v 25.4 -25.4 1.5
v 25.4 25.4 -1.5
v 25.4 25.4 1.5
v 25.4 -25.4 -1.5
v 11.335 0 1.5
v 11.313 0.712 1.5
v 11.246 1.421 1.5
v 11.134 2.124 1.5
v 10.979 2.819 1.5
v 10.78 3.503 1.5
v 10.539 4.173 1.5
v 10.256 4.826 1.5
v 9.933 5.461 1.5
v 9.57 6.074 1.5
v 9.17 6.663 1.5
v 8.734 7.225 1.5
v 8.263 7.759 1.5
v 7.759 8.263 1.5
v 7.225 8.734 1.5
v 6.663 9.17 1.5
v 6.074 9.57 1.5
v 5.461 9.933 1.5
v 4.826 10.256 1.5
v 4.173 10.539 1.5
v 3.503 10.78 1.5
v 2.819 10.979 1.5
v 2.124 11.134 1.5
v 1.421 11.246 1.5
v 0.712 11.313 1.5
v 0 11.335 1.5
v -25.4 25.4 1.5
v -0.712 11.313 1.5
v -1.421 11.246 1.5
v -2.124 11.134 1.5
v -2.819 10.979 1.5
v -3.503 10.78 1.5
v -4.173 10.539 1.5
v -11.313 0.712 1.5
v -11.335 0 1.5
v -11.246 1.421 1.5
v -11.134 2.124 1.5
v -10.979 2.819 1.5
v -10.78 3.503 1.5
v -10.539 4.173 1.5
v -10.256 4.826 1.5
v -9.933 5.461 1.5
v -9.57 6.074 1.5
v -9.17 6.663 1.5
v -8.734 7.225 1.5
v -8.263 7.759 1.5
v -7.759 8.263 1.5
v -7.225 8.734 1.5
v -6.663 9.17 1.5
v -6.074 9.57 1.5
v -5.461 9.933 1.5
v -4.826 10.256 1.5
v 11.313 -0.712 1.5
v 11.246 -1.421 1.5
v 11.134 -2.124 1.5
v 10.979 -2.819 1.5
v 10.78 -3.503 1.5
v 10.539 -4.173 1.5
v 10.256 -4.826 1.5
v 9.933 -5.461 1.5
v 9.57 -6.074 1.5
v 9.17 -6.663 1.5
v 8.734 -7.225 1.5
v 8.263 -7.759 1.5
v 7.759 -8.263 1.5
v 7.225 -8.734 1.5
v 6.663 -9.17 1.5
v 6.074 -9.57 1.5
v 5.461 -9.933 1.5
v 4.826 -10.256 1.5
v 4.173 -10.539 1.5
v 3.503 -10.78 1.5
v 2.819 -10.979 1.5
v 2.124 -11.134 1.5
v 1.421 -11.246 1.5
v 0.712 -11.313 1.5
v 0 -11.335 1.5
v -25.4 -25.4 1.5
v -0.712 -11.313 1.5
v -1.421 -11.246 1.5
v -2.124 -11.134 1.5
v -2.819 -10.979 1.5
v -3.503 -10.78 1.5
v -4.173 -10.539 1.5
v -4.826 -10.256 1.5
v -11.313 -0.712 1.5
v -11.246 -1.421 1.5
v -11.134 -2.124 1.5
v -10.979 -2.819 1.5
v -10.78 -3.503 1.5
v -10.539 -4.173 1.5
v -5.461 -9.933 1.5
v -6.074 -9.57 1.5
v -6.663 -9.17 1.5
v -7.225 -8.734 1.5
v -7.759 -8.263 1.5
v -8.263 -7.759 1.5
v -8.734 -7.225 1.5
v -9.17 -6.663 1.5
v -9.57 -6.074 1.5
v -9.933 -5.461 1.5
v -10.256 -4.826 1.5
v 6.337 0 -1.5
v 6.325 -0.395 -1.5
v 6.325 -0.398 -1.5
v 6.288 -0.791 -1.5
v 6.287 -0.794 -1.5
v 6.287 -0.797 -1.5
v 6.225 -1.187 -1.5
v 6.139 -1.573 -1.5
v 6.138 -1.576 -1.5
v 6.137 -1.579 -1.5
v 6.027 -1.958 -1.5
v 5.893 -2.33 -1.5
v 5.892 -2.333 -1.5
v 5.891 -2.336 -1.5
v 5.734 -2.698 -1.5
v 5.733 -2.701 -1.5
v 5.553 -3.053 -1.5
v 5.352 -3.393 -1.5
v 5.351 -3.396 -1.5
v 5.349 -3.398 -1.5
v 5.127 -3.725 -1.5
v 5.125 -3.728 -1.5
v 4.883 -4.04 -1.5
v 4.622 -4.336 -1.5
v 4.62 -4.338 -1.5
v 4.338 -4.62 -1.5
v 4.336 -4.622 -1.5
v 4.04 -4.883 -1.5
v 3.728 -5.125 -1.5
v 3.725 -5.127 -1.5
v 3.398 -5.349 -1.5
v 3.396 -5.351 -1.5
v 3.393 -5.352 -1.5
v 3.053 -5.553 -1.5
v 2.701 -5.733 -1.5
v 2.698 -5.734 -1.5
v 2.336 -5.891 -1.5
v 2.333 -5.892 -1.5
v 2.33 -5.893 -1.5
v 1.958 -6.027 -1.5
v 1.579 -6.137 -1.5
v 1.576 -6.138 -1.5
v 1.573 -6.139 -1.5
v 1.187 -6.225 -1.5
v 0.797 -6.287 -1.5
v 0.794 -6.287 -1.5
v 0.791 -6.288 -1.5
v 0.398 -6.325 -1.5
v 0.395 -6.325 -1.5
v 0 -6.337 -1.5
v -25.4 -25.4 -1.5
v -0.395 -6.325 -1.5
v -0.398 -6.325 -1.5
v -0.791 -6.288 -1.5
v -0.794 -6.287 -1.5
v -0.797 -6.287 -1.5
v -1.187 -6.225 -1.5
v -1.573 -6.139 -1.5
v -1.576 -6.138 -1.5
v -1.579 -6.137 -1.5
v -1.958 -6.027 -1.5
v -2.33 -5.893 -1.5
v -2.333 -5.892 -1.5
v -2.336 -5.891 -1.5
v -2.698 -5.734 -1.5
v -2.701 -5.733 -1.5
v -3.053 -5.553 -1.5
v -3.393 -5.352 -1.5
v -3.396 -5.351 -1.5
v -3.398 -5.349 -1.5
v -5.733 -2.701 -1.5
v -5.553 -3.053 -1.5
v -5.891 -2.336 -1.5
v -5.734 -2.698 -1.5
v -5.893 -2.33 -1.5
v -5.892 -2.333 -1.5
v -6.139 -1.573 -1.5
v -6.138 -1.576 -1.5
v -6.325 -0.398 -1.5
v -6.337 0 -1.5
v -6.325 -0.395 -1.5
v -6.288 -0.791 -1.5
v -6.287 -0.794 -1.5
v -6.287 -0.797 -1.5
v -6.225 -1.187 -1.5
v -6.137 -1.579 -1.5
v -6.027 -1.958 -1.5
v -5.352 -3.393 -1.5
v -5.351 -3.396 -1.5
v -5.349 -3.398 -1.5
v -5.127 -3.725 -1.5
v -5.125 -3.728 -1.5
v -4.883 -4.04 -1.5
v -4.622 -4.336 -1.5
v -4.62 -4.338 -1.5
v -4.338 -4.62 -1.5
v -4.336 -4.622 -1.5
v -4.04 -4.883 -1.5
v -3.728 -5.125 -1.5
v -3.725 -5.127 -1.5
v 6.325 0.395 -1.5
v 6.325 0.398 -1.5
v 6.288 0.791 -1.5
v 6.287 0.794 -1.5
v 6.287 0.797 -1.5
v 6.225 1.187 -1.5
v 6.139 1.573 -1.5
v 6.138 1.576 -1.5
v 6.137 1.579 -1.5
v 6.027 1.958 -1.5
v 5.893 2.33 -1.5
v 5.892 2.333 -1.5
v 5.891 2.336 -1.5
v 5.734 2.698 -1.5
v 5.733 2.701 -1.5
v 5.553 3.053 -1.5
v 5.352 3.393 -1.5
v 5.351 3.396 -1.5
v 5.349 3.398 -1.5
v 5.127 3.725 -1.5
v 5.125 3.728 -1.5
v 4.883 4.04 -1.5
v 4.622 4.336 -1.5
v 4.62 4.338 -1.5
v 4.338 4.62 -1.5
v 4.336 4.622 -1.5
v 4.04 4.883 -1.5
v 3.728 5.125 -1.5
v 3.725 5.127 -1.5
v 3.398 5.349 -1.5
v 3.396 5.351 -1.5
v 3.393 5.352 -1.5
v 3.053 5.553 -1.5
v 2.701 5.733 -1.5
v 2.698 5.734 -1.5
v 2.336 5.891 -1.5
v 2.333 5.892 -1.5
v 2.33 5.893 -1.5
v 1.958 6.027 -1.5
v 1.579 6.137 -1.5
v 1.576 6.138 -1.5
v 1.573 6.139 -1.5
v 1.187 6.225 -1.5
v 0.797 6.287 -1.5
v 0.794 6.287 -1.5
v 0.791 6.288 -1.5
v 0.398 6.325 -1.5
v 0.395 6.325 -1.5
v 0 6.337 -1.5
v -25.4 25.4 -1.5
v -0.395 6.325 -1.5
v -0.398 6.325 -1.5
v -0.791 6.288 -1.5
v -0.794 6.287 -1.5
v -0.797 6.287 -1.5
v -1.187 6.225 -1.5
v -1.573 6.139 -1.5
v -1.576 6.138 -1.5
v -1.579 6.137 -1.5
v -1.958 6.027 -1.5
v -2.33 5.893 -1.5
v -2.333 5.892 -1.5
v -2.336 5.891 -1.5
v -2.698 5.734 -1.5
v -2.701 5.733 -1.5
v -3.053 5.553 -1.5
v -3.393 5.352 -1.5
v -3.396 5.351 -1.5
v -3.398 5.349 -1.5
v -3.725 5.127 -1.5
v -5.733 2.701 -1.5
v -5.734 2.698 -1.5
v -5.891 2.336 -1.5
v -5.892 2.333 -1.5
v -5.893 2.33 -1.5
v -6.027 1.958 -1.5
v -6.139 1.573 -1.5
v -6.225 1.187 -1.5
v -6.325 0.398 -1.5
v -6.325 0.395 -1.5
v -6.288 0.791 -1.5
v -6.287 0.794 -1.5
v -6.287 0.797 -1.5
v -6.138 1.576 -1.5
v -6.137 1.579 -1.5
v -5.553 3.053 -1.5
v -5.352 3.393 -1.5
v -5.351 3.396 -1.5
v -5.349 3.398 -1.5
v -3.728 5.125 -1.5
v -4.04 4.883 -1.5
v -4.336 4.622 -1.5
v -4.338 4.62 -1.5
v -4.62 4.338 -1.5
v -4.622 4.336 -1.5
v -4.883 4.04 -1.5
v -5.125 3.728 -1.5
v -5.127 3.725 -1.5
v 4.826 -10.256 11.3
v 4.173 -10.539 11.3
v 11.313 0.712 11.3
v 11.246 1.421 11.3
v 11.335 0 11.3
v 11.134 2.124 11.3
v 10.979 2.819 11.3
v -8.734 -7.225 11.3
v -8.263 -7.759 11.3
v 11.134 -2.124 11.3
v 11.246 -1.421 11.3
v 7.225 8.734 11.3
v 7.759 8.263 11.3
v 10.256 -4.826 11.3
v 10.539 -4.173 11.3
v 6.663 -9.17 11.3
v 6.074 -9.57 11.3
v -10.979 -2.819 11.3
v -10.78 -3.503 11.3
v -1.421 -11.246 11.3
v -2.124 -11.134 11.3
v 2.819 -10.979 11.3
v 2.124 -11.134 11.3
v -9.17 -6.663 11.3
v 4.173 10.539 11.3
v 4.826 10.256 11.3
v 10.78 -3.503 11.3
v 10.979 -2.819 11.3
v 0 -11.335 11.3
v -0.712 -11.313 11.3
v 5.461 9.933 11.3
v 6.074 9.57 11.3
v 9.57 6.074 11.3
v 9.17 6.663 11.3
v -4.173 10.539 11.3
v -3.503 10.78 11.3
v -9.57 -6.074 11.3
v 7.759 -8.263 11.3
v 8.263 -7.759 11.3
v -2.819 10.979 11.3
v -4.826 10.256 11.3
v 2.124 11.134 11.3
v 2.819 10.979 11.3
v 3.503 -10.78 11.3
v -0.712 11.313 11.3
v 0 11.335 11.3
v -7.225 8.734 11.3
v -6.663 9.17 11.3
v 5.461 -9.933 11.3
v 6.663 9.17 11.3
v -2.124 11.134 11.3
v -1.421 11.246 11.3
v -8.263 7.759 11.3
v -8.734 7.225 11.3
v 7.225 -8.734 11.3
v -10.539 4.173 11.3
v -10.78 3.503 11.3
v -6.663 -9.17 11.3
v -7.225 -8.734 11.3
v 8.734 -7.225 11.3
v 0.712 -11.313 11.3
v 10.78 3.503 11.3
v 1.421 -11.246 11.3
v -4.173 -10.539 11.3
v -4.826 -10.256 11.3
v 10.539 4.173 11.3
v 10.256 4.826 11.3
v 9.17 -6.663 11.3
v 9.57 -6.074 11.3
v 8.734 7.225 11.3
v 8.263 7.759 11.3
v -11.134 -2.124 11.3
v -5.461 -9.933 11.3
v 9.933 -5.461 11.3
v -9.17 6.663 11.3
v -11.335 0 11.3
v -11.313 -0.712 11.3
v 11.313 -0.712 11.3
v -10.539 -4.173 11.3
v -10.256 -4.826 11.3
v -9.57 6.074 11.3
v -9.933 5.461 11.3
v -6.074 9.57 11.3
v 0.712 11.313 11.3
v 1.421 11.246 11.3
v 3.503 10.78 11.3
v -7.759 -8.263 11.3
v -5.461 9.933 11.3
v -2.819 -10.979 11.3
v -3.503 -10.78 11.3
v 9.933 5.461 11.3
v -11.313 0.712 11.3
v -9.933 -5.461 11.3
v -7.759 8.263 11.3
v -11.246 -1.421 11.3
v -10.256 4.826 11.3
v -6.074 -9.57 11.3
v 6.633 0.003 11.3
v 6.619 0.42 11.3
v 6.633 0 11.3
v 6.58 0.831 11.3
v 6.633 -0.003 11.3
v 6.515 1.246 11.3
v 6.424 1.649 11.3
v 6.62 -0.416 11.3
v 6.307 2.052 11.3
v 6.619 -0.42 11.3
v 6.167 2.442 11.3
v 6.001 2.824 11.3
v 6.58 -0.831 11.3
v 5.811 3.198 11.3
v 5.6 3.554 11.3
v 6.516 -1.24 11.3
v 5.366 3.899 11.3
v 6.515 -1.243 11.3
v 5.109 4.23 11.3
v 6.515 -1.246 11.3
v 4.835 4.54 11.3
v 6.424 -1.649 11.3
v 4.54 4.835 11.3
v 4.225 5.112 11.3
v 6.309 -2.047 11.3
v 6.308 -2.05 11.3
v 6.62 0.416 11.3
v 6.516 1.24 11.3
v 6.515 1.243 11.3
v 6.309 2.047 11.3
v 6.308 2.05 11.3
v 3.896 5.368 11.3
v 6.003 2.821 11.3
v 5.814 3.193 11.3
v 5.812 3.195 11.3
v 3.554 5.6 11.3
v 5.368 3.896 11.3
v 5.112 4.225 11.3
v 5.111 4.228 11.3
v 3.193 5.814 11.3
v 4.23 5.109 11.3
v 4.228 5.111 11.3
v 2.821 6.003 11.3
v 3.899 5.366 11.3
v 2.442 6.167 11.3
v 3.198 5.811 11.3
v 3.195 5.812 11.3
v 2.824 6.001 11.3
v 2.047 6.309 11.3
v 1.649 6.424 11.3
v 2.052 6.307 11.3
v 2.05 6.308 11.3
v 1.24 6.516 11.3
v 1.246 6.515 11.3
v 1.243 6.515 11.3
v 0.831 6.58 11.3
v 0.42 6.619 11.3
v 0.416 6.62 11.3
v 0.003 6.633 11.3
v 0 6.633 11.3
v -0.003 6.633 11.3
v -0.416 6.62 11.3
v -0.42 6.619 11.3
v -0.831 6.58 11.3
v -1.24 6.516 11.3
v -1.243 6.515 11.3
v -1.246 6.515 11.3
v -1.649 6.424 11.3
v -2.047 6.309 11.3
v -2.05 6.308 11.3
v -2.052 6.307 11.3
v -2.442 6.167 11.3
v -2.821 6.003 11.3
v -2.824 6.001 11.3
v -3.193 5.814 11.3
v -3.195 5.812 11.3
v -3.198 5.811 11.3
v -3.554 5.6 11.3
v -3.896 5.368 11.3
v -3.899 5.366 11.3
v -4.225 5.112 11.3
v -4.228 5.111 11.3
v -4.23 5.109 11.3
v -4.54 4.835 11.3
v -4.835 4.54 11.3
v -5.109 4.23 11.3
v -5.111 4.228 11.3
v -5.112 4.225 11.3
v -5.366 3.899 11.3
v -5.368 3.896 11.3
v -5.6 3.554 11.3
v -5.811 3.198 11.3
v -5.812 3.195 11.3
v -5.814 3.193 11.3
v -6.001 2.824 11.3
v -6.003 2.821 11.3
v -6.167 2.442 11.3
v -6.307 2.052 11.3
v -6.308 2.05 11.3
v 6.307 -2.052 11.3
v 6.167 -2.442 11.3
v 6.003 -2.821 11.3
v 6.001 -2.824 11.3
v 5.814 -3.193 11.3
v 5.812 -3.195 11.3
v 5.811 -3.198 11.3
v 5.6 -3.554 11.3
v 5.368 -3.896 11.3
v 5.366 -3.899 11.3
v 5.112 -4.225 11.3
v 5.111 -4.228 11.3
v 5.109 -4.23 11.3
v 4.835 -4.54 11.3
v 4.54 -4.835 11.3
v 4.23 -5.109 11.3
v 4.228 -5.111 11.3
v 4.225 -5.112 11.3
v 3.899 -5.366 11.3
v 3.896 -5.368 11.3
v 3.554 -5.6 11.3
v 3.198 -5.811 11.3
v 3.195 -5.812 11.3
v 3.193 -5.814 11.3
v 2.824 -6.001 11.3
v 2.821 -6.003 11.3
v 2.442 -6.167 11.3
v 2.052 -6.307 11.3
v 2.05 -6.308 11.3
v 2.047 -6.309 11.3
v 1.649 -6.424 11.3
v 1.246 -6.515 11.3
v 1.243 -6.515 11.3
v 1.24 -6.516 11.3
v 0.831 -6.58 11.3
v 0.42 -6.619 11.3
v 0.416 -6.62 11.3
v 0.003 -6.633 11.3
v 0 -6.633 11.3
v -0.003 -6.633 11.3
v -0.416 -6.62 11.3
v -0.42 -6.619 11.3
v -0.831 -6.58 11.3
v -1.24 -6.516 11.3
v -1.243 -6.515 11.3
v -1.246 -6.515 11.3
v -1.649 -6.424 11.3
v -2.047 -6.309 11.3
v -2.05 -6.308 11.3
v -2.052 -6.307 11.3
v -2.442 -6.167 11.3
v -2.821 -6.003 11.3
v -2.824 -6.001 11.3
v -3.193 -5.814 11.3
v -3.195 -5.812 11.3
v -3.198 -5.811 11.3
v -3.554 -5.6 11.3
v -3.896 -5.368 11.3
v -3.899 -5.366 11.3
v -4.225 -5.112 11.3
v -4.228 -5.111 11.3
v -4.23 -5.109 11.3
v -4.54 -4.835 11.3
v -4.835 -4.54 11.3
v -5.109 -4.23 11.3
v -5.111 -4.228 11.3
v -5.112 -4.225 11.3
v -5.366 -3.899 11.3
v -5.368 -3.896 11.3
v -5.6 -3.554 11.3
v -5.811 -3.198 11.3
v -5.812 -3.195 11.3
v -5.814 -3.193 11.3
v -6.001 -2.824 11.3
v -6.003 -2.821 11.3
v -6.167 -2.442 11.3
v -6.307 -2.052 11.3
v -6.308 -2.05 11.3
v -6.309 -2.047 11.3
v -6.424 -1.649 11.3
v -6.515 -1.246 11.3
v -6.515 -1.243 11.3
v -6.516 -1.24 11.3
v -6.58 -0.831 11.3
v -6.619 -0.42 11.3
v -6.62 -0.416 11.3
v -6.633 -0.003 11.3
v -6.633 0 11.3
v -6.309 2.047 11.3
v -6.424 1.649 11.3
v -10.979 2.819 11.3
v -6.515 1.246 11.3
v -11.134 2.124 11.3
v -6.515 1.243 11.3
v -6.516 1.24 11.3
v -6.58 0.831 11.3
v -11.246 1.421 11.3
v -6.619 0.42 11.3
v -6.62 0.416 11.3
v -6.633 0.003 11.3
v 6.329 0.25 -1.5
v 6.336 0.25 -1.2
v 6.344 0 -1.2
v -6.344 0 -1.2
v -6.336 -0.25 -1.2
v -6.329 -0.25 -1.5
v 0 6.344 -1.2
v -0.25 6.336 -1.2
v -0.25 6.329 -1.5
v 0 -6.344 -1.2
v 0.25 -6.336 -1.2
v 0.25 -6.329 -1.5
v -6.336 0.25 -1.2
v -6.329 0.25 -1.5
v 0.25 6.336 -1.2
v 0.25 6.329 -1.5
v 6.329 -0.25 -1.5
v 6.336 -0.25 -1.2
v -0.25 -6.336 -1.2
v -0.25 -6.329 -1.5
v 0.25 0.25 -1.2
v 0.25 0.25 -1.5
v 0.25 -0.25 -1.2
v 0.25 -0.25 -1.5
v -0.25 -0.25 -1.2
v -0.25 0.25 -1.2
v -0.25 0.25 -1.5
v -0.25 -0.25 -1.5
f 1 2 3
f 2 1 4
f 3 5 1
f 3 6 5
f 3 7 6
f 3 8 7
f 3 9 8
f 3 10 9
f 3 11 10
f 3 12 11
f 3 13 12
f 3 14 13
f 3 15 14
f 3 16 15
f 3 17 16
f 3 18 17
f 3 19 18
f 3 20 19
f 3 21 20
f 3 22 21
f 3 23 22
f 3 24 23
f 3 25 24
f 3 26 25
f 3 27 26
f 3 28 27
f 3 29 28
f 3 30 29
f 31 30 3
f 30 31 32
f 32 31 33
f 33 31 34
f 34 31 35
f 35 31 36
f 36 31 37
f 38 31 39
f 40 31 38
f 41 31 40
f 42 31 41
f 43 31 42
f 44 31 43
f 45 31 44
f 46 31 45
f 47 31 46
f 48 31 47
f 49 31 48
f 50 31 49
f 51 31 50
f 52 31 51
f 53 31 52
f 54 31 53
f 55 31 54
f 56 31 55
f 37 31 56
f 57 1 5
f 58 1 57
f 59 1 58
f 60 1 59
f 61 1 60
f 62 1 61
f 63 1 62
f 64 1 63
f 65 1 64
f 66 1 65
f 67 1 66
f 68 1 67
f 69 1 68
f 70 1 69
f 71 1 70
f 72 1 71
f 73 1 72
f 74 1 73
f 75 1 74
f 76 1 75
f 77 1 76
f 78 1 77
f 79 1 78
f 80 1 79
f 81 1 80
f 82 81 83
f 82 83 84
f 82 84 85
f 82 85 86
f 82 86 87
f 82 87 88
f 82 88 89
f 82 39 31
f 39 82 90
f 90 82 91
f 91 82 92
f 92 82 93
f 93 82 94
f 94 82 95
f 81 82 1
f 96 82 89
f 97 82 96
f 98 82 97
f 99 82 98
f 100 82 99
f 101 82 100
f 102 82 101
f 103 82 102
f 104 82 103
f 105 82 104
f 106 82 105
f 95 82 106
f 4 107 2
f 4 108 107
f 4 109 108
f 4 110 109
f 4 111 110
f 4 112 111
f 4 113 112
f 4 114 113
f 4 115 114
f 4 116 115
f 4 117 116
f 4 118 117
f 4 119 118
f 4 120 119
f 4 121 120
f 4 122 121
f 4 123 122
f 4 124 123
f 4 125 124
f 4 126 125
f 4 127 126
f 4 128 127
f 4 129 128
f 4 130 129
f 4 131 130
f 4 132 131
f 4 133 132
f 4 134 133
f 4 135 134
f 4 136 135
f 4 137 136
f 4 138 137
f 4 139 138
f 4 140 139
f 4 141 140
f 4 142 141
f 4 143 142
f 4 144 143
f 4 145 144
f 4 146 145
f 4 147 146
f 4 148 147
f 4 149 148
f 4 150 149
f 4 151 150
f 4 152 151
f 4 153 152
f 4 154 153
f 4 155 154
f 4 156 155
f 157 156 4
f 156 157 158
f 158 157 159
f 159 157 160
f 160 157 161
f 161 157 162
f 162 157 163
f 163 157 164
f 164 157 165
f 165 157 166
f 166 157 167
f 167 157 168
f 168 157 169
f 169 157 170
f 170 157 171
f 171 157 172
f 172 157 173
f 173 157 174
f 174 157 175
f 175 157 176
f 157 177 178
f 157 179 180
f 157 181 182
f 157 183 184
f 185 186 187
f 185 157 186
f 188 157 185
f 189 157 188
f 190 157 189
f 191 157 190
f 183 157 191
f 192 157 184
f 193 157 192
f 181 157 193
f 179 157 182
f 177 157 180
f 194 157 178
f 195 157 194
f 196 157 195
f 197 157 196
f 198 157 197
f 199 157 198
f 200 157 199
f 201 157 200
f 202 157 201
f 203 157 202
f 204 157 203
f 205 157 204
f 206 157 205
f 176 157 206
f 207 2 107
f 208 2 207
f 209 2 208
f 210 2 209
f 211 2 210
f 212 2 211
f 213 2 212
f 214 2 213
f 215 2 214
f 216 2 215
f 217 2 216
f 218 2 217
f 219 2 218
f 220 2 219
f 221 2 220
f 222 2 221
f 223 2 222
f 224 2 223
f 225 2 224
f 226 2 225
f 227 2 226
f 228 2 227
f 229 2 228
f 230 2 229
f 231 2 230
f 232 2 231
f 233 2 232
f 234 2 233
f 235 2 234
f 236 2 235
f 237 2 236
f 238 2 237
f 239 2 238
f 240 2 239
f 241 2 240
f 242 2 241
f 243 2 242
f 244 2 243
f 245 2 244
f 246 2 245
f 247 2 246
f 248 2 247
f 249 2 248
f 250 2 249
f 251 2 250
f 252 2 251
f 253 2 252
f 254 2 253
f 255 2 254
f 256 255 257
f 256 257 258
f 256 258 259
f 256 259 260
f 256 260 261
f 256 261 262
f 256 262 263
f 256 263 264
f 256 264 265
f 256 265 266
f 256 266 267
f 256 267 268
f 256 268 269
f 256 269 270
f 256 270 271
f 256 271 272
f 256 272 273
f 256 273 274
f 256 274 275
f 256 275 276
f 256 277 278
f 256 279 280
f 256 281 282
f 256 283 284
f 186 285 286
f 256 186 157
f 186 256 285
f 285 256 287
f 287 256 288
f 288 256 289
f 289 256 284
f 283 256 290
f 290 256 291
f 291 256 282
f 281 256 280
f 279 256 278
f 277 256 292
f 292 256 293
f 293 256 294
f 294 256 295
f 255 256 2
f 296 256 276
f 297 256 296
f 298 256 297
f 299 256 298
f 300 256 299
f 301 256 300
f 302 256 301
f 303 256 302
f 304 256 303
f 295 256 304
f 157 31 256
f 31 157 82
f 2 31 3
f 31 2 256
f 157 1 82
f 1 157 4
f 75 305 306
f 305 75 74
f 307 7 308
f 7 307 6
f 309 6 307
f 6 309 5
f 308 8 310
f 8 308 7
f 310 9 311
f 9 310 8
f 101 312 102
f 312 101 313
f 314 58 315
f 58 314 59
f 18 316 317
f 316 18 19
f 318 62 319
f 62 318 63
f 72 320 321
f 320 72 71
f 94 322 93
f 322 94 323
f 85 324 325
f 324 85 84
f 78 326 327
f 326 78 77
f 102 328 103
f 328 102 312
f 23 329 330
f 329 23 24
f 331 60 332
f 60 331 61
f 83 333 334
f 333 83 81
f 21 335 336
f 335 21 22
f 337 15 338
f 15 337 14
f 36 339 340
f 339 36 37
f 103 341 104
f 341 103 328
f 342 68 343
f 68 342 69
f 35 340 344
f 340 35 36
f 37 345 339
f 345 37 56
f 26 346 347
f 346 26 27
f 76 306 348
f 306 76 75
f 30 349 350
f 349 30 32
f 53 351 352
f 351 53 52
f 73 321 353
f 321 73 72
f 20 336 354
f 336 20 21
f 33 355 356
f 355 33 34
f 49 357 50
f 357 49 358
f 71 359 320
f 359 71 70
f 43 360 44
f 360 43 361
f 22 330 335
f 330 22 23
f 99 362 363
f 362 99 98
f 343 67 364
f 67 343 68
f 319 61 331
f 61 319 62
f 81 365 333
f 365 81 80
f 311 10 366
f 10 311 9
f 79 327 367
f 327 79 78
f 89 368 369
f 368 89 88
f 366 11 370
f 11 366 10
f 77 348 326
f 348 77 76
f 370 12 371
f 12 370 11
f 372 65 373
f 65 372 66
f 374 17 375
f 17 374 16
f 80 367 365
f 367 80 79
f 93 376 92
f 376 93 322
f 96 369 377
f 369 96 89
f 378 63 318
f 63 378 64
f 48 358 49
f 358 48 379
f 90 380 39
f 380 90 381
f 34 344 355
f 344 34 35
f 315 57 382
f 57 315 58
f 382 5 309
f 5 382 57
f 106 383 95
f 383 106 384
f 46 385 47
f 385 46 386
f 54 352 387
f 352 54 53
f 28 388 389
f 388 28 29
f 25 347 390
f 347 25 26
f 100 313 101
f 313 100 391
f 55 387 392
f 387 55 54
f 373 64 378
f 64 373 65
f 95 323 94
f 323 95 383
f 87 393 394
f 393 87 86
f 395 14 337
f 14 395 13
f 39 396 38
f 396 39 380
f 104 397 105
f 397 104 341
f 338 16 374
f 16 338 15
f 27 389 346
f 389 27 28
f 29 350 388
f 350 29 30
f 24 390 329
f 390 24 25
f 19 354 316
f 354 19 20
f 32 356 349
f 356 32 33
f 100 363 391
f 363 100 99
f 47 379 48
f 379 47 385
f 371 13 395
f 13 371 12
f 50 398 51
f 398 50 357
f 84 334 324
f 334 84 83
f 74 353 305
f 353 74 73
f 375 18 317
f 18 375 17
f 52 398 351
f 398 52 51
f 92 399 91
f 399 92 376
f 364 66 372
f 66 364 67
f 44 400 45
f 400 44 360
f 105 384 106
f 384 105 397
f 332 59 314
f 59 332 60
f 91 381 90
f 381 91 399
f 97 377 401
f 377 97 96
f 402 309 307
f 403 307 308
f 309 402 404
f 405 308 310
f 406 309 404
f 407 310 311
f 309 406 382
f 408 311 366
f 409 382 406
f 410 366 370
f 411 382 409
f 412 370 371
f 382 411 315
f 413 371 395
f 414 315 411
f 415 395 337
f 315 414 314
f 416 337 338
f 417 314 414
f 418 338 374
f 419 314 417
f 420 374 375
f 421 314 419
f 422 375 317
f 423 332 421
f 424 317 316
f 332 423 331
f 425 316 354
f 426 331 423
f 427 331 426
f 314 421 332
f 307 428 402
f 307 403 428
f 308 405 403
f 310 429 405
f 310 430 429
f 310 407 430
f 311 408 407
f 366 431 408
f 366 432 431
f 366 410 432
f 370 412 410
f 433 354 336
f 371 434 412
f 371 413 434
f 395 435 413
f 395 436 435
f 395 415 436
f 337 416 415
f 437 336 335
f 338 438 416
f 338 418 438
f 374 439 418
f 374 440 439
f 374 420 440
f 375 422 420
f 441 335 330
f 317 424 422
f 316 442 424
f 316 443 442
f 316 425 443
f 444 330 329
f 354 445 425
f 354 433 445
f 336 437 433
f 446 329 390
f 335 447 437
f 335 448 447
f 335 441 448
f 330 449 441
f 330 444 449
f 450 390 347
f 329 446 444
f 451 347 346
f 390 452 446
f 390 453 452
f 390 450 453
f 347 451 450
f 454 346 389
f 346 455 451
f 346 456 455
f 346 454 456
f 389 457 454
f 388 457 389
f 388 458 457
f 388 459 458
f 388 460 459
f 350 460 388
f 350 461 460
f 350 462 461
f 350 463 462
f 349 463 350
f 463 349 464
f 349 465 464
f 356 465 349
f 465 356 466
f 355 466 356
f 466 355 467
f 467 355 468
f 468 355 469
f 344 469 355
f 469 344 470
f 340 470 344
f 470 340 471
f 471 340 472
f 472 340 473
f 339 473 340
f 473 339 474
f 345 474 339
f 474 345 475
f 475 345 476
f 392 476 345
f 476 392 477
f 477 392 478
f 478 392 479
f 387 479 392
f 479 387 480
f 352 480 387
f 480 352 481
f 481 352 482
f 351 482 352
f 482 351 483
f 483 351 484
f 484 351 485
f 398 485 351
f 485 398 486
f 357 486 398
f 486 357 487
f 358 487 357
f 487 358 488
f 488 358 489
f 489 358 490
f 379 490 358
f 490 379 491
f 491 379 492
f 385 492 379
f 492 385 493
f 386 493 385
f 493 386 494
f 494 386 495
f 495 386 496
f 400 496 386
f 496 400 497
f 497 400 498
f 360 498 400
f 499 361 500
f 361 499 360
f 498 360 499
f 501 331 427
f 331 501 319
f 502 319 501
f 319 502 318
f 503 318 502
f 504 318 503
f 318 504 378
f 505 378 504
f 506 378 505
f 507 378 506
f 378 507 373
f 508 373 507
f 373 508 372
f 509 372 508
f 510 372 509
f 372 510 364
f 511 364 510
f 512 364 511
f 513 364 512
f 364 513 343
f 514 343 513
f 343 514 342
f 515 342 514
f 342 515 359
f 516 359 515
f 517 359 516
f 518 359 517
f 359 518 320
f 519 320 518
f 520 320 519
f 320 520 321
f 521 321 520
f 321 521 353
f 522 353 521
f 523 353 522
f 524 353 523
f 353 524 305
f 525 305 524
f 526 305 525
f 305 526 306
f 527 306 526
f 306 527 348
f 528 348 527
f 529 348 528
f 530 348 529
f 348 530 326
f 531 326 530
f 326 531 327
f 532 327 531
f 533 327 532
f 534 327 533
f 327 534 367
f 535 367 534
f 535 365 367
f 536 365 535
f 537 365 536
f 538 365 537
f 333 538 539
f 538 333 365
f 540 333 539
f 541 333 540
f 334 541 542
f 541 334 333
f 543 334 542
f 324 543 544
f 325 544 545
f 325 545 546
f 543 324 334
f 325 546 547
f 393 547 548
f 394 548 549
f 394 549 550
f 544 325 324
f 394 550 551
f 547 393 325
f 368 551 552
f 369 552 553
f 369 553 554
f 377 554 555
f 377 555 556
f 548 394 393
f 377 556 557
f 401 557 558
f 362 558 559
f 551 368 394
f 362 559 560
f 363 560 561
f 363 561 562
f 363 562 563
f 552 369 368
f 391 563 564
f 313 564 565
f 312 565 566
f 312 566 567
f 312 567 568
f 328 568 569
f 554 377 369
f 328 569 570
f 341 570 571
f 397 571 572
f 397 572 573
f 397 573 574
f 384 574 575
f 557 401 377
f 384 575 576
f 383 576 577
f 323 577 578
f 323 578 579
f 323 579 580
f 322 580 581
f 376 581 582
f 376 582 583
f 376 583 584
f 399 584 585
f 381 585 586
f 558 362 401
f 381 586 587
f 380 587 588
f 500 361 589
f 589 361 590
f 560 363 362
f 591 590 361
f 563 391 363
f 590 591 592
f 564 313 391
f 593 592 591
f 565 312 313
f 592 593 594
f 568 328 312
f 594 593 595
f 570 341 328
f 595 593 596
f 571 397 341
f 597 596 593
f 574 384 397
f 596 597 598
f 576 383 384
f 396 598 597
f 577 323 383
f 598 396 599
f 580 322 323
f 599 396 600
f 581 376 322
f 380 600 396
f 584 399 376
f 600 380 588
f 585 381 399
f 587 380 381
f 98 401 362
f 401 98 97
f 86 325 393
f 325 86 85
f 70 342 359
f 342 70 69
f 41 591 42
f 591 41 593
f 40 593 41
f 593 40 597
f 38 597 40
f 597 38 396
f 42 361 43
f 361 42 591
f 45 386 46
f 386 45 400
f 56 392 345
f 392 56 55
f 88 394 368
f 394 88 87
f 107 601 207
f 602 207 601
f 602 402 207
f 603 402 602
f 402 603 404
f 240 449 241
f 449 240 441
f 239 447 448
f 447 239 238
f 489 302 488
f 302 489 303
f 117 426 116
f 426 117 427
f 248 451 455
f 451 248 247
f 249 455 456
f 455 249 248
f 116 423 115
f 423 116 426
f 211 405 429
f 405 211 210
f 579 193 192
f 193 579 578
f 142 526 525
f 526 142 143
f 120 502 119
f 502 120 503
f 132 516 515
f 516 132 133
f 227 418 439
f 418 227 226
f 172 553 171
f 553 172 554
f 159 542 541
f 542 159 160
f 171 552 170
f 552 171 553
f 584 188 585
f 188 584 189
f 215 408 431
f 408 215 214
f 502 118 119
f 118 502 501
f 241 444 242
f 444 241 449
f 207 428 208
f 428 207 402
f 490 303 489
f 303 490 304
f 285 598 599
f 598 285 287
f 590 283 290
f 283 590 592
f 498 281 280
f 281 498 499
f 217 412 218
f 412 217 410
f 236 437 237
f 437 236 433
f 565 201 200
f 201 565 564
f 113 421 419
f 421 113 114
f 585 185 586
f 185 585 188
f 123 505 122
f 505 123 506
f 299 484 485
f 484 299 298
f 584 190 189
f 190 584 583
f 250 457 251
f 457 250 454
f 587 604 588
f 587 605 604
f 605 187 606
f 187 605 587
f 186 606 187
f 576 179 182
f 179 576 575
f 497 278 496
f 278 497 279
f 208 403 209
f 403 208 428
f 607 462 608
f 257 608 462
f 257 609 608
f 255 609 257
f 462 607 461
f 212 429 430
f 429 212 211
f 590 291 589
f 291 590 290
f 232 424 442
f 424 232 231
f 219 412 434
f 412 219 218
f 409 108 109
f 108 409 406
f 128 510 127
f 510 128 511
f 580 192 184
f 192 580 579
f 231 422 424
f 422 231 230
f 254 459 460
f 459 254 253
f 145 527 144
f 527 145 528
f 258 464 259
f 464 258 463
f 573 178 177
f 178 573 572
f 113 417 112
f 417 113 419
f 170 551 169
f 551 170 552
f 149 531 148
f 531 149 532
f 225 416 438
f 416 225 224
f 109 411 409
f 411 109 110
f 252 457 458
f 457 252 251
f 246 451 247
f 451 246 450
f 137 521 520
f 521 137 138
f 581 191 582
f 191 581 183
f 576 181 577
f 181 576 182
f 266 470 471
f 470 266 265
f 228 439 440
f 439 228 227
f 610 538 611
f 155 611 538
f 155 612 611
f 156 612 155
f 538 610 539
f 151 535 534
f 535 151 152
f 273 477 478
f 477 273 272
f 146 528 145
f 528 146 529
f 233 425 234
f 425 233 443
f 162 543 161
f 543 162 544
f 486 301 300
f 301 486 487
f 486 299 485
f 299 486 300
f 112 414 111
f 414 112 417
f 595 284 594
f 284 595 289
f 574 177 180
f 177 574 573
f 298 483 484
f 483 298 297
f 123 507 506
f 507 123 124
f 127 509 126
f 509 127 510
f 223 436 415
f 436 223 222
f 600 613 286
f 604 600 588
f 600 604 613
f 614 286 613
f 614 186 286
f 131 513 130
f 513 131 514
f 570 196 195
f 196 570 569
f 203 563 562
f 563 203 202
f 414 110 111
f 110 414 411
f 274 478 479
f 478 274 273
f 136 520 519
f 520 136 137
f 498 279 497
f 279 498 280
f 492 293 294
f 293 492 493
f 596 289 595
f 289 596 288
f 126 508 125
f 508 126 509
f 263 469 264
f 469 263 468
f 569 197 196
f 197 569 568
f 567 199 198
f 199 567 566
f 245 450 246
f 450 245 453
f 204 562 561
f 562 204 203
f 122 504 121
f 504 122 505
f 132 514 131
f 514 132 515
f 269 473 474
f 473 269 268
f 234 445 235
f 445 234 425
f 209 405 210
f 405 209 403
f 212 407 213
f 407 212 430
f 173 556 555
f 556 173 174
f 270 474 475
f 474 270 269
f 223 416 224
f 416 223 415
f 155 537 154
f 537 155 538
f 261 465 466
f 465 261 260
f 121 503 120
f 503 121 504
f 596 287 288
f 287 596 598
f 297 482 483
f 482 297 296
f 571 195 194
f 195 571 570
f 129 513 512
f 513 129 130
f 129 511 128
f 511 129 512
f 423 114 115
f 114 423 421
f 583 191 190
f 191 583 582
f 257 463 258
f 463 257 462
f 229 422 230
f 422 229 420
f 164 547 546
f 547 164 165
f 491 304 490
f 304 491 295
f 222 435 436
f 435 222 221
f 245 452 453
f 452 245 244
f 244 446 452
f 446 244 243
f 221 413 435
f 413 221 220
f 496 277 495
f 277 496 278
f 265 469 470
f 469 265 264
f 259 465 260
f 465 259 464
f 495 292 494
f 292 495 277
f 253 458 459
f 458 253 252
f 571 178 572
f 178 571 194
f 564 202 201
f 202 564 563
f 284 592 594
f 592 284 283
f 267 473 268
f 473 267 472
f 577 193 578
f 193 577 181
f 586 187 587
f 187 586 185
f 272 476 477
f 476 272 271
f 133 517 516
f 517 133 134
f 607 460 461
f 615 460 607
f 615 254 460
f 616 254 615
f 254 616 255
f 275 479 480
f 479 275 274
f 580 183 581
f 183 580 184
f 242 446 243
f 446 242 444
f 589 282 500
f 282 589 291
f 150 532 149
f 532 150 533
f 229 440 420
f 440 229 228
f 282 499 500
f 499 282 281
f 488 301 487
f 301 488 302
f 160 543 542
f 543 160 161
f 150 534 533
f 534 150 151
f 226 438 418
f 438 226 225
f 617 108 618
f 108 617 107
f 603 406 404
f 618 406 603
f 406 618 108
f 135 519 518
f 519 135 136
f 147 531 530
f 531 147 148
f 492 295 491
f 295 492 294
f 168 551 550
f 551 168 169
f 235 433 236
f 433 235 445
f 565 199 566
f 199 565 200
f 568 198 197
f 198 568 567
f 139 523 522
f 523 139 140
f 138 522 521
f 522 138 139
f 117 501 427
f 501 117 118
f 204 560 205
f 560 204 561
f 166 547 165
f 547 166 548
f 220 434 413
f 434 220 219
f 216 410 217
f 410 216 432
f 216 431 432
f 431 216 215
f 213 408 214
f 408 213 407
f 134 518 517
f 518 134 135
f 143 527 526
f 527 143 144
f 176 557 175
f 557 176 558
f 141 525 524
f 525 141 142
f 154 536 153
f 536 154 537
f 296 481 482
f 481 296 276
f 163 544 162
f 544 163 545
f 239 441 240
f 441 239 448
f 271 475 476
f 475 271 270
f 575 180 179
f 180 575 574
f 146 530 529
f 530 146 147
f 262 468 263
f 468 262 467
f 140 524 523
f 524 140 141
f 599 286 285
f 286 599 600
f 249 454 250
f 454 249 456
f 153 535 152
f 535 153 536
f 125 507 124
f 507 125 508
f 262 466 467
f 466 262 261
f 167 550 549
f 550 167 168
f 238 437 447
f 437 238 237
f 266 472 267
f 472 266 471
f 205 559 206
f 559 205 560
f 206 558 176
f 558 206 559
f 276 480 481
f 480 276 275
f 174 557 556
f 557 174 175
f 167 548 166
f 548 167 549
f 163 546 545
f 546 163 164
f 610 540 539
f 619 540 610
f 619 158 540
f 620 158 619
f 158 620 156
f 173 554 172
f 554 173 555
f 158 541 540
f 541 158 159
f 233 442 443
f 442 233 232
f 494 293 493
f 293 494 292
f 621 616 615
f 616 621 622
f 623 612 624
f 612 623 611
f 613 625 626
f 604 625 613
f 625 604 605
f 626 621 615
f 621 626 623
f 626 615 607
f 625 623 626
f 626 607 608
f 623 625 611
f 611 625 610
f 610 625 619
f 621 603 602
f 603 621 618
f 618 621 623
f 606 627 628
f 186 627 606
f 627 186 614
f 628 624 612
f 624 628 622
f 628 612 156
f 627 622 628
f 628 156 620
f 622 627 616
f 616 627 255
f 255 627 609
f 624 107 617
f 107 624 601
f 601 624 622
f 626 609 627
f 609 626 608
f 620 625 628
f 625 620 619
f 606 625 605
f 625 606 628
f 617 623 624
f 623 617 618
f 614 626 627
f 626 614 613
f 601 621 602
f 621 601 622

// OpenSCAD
// file: myTools.scad
module tube (r = 0, d = 0, l = 0, 
            thick = 0, 
            bCentered = true, 
            taper_pct = 0, 
            circlip = false) // r=radius d=dia l=length 
{
    assert( r != 0 || d != 0, "specify one of radius or diameter");
    assert( l != 0 , "tube: need length 'l' to be non zero");
    assert( thick != 0, "wall thickness cannot be zero");

    punch = $preview ? .2 : 0; // stop funny view artifact

    dia = r ? r * 2 : d;

    od = ((thick > 0) ? dia + thick * 2 : dia);
    id = (thick > 0) ? dia             : dia  + thick *2; 

    
    
    if (thick > 0)
        echo ("tube\tMIN id = ", id, "od = ", od, "wall = ", thick, "center= ", bCentered);
    else
        echo ("tube\tMAX od = ", od, "id = ", id, "wall = ", thick, "center= ", bCentered);

    echo ("tube\tHeigth = ", l);
        
    if (taper_pct != 0)
    {
        echo ("tube\t*** OD expanded by ", taper_pct, "%, : bottom od = ", od * (1. +taper_pct/100), "top od = ", od);
    }
    
    assert(dia || dia < 0, "tube : missing r or d ");
    
    // if taper_pct specified, the base will always be closest to 0,0,0
    translate([ 0, 0, taper_pct == 0 ? 0: bCentered ? l/2:l  ])
    rotate([0, taper_pct == 0 ? 0 : 180, 0 ])

    difference()
    {
        // make a reese's cup
        {
            color("YELLOW", .3)
            linear_extrude(height= l, scale = 1 + taper_pct/100)
                difference()
                {
                    circle(d = od);
                    circle(d = .5);
                }
        }
    
     // hollow out reessed cup
     color("GREEN")
     translate([0, 0, -punch/2])
     linear_extrude(height= l+ punch*2, $fn=100)
     {
        circle(d = id);
        if (circlip) #square([1 + punch, od ]);
     }
    
    }
}
//==============================================================================
        
module abox (dims, 
            thick = 0, 
            bCentered = true, 
            round_out = 0, 
            round_in = 0, 
            bSolid = false,
            bHollow = false,
            elevator = 0)   // move bottom up by X
{
    punch = $preview ? .1 : 0; // stop funny view artifact
    
    assert(thick != 0, "Thick must be specified. +=outside dim, -= inside dims");
    
    
//    assert(dims.z > thick, "wall thickness too large for depth of box");

    wall2 = abs(thick) * 2; // 2 walls in each direction
    wall = wall2 / 2;
    
    // box either grows inward (thick < 0) or outward (thick > 0)  from dims
    fat = dims + [ wall2, wall2, wall];
    thin = dims - [ wall2, wall2, wall];
    
    offset = (thick > 0 && bCentered == false) ? wall : 0;
    
    //echo ("abox : adjusting x,y,z by ", offset, " to move origin from  center to 0,0,0");
    translate( [ bCentered ? 0 : dims.x /2 + offset, bCentered ? 0 : dims.y /2 + offset, bCentered ? 0 : dims.z /2 + offset/2]) 
    {
        if (thick > 0)
        {   
            // wall grows outwards from users dim
            echo ("making a box, MAX INSIDE dim = ", dims);
            echo ("   wall=", thick, " mm");
            echo ("   calc outside = ", fat, " mm");
        }
        else
        {
            // wall grows inward from users dime
            echo ("making a box, MAX OUTSIDE dim = ", dims);
            echo ("    wall=", thick, "mm");
            echo ("    calc inside = ", thin, " mm");
        }
        echo (" ");
        
        // linear extrude alway works in the positive x/y plane an goes upward.
        // after calc, re-center about 0,0,0 where a bCentered cube would be
        
        translate([ 0, 0, thick > 0  ? -fat.z/2 : -dims.z/2 ])
        difference()
        {
            echo ("round_out = ", round_out);

            // MAKE SOLID BOX --------------------------------------
            router_outside = round_out ? round_out : 0;
            x = thick > 0  ? fat.x - router_outside : dims.x - router_outside;
            y = thick > 0  ? fat.y - router_outside : dims.y - router_outside;


            // MAKE PUCHNED INSIDE
            // using 'offset' it will add r on all dimensions, then round., 
            // so now you have fatter perimeter than you started with :(
            //  but at least the corners are round.
            
            // Compensate by shrinking dimension by r, 
            // and then by calling offset, offset will then add it back

            //color("YELLOW", .2)

            // ready height 
            linear_extrude(thick > 0  ? fat.z : dims.z)
            if (round_out)
            {
                offset( r= round_out, $fn=30)
                square( [x - router_outside, y - router_outside], true);
            }
            else
            {
                // no rounding on outside dims.
                square( [x, y], true);
            }
            // time to punch out the inside if requested.
            if (bSolid == false)
            {
                hollow_offset = bHollow ? fat.z/2 + .2  : dims.z/2 +.2;
                // punching out inside. its either dims or thin.
                router_inside = round_in;
                echo ("round_in = ", router_inside);
                xi = thick > 0  ? dims.x  : thin.x;
                yi = thick > 0  ? dims.y : thin.y ;

                color("GREEN")

                // move 'punch' up if you need a bottom else zero (hollowed out)

                translate([ 0,0, bHollow ? -.1 : wall + elevator]) 
                linear_extrude(thick > 0  ? fat.z - wall  + hollow_offset : dims.z - wall + hollow_offset)
                //#linear_extrude(fat.z - wall  + hollow_offset)
                
                if (round_in) 
                {
                    offset( r= round_in, $fn=30)
                    square( [ xi - round_in*2, yi - round_in*2], true);
                }
                else
                    square( [ xi, yi], true);
            }
        }
    }
 }
//-----------------------------------------------------
module abox_punch (dims, 
            thick = 0, 
            bCentered = true, 
            round_out = 0, 
            round_in = 0, 
            bSolid = false,
            bHollow = false,
            elevator = 0)   // move bottom up by X
{
    // move bottom down by wall thickness to blow out bottom
    abox(dims, thick, bCentered,
         round_out, round_in, bSolid = false, 
         bHollow=true, elevator = -thick);
}



// 50x25x10 box walls grow inward (-2). on center origin midpoint
// rounded outside (default), sharp corner inside(default), bCentered about 0,0,0
//color("GREEN", .9)
//abox([50,25, 10], -2, true); 


// 50x25x10 box walls grow outward (+2). on center origin midpoint
// sharp outside corners, rounded inside corners. Sit on x,y plane
color("BLUE", .9)
abox([50,20, 10], +2, round_in=2, bCentered = false);  // 50x25x10 box inside dim origin has 0,0


// 50x25x10 box walls grow inward (-2). on center origin midpoint
// sharp corners inside and out. sits on x,y plane
color("GREY", .9)//
translate([ 55, 0, 0])      
abox([50,20, 10], +2, round_out=3, false);

color("PINK", .9)//
translate([ 55 * 2, 0, 0])      
abox_punch([50,20, 10], +2, round_out=3, false);

color("GREEN", .9)//
translate([ 55 * 3, 0, 0])      
abox_punch([50,20, 10], +2, round_in=2, false);


color("CYAN", .9)//
translate([ 55 * 4, 0, 0])      
abox_punch([50,20, 10], +2, round_in=2, round_out=2, false);


/*
color("GREEN", .9)//
translate([ 140, 10, -10])      
abox([86.66, 56.865, 5], 3, bHollow = true, bCentered = false); 
*/

/*
// 50x25x10 box walls grow inward (-2). on center origin midpoint
// round corners outside and SOLID
color("BLUE", .9)//
translate([ 55, 0, 0])      
abox([50,25, 10], +2, round_out=2, round_in=0, false, bSolid = true); // 50x25x10 box outside dim origin is 0,0
*/

//translate ([-30,-30, 0])
{
/*
    // tube outer dia  20, inner dia = (20 - 8)
    color("PINK")
    tube (d = 20, l = 20, thick = -8, bCentered = false);

    // tube, inner dia = (2* 10), outer dia = ((2*10) + 2) 
    color("PURPLE", .3)
    tube (r = 10, l = 20, thick = +2, bCentered= true);
*/
/*
    tube (d = 60, l = 20, thick = -6, bCentered = false);

    translate([0, 0, 50])
    tube (d = 60, l = 20, thick = -6, bCentered = false, taper_pct = 20, circlip = true);
    //color("GREEN")
    //tube (d = 20, l = 20, thick = -2, bCentered = false, taper = 10, circlip = true);
*/

}
// main file
use <myTools.scad>
$fn=100;

SQ=25.4 *2;
TH=3;
DRILL= 12.67;  //.5 * 25.4;

difference()
{
    union()
    {
        cube([SQ,SQ,TH], true);
        cylinder(h = 10+TH/2-.2, d=DRILL+10);
    }
    translate( [ 0, 0, -TH/2-.1])
    {
        #cylinder(h=10 + TH, d1 = DRILL, d2 = DRILL+ .6);
    }
}
 
translate([0,0, -TH/2 + .3/2])
{
    cube([.5, SQ, .3], true);
    rotate([ 0, 0, 90])
    cube([.5, SQ, .3], true);
}
